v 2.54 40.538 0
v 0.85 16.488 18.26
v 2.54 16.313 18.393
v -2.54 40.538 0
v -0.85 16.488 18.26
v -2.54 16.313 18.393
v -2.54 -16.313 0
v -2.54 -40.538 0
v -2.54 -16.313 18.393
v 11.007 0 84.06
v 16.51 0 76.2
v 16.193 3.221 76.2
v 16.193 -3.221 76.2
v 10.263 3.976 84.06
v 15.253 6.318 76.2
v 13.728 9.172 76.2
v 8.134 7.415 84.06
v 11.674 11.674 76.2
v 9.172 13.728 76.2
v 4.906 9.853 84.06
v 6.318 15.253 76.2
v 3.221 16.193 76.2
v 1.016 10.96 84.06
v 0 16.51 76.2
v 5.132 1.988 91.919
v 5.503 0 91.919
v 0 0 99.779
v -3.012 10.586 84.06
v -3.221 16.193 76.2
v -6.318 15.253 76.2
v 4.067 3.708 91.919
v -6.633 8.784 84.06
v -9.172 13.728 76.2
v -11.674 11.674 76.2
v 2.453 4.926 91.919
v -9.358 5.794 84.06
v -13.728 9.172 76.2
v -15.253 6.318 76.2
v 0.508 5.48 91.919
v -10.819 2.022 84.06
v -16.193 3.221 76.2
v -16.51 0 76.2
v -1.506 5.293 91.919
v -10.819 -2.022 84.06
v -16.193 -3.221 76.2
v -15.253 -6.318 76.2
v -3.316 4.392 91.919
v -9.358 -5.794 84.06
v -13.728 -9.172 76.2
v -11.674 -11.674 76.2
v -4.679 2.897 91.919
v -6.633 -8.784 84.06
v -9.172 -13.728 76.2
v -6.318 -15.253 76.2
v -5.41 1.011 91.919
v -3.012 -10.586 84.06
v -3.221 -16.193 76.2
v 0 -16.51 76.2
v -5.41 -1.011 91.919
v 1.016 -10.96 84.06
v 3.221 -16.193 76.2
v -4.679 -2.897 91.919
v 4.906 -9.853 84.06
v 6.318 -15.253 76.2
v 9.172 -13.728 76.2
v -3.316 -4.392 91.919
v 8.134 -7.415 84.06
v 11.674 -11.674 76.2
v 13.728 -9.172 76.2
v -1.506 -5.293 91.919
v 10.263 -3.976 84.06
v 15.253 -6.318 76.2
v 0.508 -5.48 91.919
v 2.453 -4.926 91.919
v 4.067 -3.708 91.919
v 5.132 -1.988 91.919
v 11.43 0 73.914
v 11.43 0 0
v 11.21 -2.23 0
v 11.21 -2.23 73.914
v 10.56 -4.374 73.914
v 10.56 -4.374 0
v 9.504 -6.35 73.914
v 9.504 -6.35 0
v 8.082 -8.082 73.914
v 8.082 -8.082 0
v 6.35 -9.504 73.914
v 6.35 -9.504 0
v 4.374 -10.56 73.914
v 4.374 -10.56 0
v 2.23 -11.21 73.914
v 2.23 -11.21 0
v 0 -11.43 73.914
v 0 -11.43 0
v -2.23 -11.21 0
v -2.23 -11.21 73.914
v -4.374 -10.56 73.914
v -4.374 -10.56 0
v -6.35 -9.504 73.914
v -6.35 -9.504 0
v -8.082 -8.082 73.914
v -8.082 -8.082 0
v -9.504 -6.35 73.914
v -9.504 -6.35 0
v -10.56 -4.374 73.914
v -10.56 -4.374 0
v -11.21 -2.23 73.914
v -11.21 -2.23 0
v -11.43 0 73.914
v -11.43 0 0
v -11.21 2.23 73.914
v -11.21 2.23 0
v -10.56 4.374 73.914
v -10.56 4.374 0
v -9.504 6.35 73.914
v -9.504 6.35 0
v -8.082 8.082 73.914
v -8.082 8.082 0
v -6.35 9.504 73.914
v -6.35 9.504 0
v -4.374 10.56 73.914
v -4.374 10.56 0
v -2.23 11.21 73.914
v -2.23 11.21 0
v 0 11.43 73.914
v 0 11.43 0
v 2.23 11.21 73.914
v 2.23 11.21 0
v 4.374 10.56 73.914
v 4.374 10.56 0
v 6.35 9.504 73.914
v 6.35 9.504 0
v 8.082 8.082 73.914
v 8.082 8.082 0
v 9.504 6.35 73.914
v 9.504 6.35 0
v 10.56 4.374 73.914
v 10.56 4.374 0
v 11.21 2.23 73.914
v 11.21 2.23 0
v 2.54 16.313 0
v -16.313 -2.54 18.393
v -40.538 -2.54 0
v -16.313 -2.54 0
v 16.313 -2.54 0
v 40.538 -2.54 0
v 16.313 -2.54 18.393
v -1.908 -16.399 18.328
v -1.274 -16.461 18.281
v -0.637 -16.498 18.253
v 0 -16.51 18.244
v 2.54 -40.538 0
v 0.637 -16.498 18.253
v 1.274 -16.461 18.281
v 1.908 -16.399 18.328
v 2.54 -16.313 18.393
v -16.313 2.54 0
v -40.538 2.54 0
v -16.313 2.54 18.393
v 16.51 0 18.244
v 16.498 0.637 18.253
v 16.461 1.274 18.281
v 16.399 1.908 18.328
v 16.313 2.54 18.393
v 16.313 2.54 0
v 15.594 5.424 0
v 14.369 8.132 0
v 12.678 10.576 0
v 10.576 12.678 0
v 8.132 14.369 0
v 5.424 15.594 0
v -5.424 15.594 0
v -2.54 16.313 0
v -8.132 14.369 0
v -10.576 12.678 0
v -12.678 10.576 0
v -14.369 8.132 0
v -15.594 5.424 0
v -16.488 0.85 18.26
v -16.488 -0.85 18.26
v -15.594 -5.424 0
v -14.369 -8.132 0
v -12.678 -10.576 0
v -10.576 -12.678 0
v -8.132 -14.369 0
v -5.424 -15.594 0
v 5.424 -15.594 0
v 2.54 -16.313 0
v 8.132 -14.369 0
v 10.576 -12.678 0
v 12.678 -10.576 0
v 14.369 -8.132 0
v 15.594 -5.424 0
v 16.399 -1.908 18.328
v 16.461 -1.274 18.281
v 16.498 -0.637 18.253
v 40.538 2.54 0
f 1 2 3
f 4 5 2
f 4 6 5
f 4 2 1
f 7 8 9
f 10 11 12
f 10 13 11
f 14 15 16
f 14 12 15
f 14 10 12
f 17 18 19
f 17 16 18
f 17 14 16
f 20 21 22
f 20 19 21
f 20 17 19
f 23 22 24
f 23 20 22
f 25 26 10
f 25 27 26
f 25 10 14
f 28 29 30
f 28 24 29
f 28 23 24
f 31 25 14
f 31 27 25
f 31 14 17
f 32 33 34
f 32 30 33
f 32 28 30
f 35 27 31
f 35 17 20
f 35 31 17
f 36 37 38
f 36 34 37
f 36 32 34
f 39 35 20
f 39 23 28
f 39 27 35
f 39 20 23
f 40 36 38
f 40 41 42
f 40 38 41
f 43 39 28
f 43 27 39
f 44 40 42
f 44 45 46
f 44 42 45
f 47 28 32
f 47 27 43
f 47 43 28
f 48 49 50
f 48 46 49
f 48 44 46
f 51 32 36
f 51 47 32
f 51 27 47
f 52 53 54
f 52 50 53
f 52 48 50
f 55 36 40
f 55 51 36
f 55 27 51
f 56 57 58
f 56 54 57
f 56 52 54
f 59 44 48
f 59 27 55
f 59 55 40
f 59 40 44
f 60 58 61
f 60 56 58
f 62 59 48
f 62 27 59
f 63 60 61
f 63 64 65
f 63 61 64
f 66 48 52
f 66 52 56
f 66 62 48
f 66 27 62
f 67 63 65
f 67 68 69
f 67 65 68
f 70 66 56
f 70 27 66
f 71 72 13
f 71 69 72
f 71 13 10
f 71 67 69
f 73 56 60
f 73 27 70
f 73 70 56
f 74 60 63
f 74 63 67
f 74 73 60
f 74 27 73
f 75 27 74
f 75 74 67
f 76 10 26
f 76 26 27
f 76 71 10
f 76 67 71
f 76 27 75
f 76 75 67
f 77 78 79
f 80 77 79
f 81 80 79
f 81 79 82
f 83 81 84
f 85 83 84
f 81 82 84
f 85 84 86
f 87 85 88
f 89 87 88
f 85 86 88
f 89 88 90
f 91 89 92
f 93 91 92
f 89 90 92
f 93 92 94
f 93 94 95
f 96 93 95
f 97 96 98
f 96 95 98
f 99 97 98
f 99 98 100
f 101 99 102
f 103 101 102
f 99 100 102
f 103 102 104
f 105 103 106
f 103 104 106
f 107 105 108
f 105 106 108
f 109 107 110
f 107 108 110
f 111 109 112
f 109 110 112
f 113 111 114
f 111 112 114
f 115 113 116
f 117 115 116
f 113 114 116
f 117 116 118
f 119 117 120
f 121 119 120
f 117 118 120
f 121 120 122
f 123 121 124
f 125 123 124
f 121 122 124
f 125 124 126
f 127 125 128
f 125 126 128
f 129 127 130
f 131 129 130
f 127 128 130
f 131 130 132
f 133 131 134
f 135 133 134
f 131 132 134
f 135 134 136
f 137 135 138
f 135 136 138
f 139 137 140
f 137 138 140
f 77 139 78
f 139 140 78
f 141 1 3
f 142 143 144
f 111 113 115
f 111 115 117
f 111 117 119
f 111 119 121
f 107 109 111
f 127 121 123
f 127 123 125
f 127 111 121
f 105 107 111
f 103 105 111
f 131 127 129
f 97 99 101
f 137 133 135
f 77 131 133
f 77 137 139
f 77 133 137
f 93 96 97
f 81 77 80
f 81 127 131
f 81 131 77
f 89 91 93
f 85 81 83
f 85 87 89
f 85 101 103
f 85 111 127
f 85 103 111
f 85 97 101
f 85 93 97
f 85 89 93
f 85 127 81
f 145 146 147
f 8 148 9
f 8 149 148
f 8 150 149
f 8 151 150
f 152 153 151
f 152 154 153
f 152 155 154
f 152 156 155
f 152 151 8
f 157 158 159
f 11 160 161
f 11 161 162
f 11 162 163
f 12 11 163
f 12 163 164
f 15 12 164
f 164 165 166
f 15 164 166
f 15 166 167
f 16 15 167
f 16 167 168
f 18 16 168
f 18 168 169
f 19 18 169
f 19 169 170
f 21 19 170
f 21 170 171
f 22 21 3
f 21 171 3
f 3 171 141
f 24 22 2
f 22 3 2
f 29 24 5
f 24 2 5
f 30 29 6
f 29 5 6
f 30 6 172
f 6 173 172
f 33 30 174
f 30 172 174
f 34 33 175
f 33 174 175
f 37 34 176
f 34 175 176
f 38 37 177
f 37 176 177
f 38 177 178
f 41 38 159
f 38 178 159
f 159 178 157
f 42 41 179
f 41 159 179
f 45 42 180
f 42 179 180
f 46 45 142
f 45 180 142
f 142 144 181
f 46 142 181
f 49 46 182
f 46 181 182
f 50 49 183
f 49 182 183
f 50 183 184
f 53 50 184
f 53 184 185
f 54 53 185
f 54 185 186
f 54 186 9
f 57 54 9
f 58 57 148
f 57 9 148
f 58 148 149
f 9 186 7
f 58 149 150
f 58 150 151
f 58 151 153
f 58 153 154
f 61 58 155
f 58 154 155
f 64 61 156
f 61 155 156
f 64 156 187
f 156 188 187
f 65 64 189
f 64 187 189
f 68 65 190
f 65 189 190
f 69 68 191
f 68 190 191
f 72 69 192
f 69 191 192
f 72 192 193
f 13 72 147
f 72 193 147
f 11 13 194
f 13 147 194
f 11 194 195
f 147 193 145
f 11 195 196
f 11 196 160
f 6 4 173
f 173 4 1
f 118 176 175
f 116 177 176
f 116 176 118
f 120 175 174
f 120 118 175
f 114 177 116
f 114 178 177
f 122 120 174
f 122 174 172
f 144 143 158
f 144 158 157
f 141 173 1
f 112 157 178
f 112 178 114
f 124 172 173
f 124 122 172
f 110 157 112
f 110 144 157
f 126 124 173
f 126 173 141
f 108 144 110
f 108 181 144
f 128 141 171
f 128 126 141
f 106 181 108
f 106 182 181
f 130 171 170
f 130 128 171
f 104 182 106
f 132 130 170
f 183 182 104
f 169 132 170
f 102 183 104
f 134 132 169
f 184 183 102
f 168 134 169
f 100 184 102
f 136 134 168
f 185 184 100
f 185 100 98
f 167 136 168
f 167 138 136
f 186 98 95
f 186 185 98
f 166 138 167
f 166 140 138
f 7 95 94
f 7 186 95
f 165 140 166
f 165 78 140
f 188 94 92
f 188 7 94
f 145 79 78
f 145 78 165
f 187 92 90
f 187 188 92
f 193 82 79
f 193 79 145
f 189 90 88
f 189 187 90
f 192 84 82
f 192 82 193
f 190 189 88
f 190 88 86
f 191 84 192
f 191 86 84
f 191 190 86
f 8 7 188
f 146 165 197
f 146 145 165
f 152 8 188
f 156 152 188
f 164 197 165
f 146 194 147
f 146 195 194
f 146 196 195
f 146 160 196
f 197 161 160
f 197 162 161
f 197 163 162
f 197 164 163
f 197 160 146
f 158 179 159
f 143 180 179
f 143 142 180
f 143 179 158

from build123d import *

# Parameters (mm, degrees)
F0_R      = 16.51
F0_R_2    = 12.7
F1_DEPTH  = 76.2
F1_FACE_R = 16.51
F2_DEPTH  = 25.4
F2_TAPER  = 35
F4_DEPTH  = 2.54
F5_COUNT  = 4
F6_R      = 11.43
F7_DEPTH  = 73.914


with BuildPart() as f1:
    # F0 (on Top) → F1 (new body)
    with BuildSketch(Plane.XY):
        Circle(F0_R)
        Circle(F0_R_2, mode=Mode.SUBTRACT)
        Circle(F0_R_2)
    extrude(amount=F1_DEPTH)

    # F1_face (on face) → F2 (join)
    with BuildSketch(Plane.XY.offset(76.2)):
        Circle(F1_FACE_R)
    extrude(amount=F2_DEPTH, taper=F2_TAPER)

    # F3 (on Right) → F4 (join, symmetric)
    with BuildSketch(Plane.YZ):
        Polygon((-40.5384004116, 0), (-15.8495996147, 0), (-15.8495996147, 18.7452007085), align=None)
    extrude(amount=F4_DEPTH, both=True)

    # F5: F1 ×4 about axis
    f5_axis = Axis((0, 0, 76.2), (0, 0, 1))


with BuildPart() as f1_1:
    add(f1.part)
    for i in range(1, F5_COUNT):
        add(f1.part.rotate(f5_axis, i * 360 / F5_COUNT))

    # F6 (on face) → F7 (cut)
    with BuildSketch(Plane(origin=(0, 0, 0), x_dir=(1, 0, 0), z_dir=(0, 0, -1))):
        Circle(F6_R)
    extrude(amount=-F7_DEPTH, mode=Mode.SUBTRACT)


solid = f1_1.part
